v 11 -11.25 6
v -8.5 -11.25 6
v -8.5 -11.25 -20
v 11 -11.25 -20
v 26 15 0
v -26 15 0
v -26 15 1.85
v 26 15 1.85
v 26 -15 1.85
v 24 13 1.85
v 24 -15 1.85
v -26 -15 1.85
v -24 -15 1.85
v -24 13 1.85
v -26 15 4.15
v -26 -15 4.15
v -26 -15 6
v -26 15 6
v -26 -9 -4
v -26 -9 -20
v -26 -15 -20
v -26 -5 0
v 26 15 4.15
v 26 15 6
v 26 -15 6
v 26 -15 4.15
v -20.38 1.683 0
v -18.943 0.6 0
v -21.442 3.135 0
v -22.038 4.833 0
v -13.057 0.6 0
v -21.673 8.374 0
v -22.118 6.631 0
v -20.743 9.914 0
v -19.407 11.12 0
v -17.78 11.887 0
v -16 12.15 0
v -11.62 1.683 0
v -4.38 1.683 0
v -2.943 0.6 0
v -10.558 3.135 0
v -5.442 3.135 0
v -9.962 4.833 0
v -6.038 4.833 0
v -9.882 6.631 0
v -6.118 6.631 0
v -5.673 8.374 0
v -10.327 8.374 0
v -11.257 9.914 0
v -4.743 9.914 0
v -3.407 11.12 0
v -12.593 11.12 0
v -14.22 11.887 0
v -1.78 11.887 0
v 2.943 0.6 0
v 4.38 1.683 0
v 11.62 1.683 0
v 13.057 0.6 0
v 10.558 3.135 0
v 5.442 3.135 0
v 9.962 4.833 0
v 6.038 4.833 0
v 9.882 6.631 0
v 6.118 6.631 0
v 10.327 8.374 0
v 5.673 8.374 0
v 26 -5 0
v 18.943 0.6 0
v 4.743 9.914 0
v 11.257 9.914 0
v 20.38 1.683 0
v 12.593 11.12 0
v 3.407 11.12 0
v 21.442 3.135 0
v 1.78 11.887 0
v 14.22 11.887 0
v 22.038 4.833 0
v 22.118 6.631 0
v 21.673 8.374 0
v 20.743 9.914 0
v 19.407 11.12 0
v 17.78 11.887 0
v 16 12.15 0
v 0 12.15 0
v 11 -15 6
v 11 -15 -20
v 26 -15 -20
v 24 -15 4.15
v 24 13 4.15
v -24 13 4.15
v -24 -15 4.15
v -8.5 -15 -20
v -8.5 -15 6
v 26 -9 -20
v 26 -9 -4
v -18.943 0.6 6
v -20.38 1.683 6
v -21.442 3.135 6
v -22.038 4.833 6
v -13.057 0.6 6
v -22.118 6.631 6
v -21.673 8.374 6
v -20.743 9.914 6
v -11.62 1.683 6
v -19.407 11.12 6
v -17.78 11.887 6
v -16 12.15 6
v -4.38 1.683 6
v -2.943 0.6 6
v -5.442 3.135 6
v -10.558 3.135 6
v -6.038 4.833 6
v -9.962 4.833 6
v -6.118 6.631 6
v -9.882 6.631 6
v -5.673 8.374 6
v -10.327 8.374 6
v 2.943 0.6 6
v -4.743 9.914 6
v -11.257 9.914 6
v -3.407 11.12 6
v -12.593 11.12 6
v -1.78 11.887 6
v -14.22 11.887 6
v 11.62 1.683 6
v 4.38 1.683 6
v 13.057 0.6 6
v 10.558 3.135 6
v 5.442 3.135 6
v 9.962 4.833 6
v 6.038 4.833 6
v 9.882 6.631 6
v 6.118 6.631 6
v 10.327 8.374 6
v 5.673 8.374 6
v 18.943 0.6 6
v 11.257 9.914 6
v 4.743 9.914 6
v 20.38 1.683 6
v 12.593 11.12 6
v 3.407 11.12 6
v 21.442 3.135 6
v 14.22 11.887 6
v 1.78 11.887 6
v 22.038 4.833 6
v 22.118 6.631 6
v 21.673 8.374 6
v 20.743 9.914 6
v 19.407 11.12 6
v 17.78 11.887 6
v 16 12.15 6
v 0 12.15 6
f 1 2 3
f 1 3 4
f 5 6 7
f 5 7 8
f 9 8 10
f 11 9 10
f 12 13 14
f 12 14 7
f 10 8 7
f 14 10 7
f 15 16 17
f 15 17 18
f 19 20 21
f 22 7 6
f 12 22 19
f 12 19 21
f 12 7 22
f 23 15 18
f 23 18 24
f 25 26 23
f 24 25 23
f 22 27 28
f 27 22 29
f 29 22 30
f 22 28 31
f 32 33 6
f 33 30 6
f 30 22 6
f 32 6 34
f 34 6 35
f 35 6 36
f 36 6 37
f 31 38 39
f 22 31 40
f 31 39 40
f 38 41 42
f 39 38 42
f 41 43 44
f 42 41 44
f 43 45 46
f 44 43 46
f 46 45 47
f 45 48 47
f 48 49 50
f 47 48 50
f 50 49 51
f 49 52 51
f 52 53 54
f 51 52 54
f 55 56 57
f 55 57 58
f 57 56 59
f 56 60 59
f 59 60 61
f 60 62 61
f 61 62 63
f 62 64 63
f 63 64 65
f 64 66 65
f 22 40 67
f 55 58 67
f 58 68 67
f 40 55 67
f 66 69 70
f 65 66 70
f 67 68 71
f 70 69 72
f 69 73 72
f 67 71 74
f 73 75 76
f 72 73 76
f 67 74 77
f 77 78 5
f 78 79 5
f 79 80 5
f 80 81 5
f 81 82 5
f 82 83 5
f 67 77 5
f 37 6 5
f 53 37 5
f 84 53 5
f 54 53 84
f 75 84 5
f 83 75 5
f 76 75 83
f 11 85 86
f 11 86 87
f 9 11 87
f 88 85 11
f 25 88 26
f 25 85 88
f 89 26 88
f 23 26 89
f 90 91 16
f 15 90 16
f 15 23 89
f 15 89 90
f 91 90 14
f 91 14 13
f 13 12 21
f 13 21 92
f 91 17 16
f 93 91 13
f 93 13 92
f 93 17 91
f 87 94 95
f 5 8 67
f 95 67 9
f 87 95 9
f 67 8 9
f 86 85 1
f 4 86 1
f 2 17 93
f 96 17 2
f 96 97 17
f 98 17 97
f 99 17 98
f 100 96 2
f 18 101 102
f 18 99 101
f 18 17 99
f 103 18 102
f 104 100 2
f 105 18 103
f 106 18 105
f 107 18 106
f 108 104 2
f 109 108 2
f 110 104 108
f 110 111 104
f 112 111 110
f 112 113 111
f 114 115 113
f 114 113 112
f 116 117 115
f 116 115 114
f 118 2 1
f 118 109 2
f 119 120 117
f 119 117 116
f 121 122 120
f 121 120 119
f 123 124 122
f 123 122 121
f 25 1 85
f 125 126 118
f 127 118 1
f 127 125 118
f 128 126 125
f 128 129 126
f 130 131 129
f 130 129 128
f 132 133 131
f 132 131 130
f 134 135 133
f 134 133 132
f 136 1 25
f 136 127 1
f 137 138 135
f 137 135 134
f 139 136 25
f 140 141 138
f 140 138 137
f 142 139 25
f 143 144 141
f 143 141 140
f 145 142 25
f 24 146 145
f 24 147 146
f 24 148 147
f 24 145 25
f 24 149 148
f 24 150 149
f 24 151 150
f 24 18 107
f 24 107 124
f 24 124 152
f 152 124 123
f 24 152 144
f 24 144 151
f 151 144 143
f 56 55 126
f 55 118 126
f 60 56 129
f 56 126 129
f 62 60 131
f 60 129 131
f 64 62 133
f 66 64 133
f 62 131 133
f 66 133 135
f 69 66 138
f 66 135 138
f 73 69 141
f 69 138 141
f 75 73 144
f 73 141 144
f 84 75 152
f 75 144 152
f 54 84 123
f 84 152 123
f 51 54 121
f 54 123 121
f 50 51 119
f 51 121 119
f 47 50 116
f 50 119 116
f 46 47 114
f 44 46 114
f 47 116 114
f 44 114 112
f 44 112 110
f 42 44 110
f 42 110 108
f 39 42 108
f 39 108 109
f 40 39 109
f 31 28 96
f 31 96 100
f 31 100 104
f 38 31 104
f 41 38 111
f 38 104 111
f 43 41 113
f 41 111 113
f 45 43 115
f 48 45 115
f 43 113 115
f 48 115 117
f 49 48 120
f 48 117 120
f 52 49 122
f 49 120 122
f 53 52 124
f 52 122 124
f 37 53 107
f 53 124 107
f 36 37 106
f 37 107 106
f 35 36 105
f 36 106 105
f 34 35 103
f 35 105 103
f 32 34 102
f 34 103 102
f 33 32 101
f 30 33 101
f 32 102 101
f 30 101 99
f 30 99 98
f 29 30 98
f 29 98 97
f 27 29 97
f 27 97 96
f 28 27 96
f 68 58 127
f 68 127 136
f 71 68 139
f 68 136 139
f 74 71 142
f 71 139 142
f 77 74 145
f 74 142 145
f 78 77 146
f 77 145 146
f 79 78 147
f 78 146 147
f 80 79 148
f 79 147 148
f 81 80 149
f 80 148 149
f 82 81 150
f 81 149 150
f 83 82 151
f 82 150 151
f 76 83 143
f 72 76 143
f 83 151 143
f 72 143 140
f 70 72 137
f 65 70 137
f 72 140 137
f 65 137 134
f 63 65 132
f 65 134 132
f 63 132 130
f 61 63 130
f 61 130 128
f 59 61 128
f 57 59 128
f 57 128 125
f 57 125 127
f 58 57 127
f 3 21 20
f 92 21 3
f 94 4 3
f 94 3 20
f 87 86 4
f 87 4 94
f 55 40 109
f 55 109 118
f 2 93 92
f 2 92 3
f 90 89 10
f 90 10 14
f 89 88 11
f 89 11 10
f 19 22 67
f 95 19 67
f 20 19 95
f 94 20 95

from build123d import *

# Parameters (mm, degrees)
SKETCH_W        = 52
SKETCH_H        = 30
PAD_DEPTH       = 6
SKETCH001_R     = 6.15
POCKET_DEPTH    = 6
SKETCH002_W     = 30
SKETCH002_H     = 2.3
POCKET001_DEPTH = 2
SKETCH003_W     = 52
SKETCH003_H     = 2.3
POCKET002_DEPTH = 2
SKETCH004_W     = 30
SKETCH004_H     = 2.3
POCKET003_DEPTH = 2
SKETCH005_W     = 52
SKETCH005_H     = 6
PAD001_DEPTH    = 20
SKETCH006_W     = 19.5
SKETCH006_H     = 3.75
POCKET004_DEPTH = 26
CHAMFER_SIZE    = 4
SKETCH007_W     = 45
SKETCH007_H     = 2
PAD002_DEPTH    = 6


with BuildPart() as part:
    # Sketch → Pad (new body)
    with BuildSketch(Plane.XY):
        Rectangle(SKETCH_W, SKETCH_H)
    extrude(amount=PAD_DEPTH)

    # Sketch001 (on Face6 of Pad) → Pocket (cut)
    with BuildSketch(Plane.XY.offset(6)):
        with Locations((-16, 6)):
            Circle(SKETCH001_R)
        with Locations((0, 6)):
            Circle(SKETCH001_R)
        with Locations((16, 6)):
            Circle(SKETCH001_R)
    extrude(amount=-POCKET_DEPTH, mode=Mode.SUBTRACT)

    # Sketch002 (on Face3 of Pocket) → Pocket001 (cut)
    with BuildSketch(Plane.YZ.offset(26)):
        with Locations((0, 3)):
            Rectangle(SKETCH002_W, SKETCH002_H)
    extrude(amount=-POCKET001_DEPTH, mode=Mode.SUBTRACT)

    # Sketch003 (on Face1 of Pocket001) → Pocket002 (cut)
    with BuildSketch(Plane(origin=(0, 15, 0), x_dir=(-1, 0, 0), z_dir=(0, 1, 0))):
        with Locations((0, 3)):
            Rectangle(SKETCH003_W, SKETCH003_H)
    extrude(amount=-POCKET002_DEPTH, mode=Mode.SUBTRACT)

    # Sketch004 (on Face6 of Pocket002) → Pocket003 (cut)
    with BuildSketch(Plane(origin=(-26, 0, 0), x_dir=(0, -1, 0), z_dir=(-1, 0, 0))):
        with Locations((0, 3)):
            Rectangle(SKETCH004_W, SKETCH004_H)
    extrude(amount=-POCKET003_DEPTH, mode=Mode.SUBTRACT)

    # Sketch005 (on Face2 of Pocket003) → Pad001 (join)
    with BuildSketch(Plane(origin=(0, 0, 0), x_dir=(1, 0, 0), z_dir=(0, 0, -1))):
        with Locations((0, 12)):
            Rectangle(SKETCH005_W, SKETCH005_H)
    extrude(amount=PAD001_DEPTH)

    # Sketch006 (on Face19 of Pad001) → Pocket004 (cut)
    with BuildSketch(Plane.XY.offset(6)):
        with Locations((1.25, -13.125)):
            Rectangle(SKETCH006_W, SKETCH006_H)
    extrude(amount=-POCKET004_DEPTH, mode=Mode.SUBTRACT)

    # Chamfer
    chamfer_edges = [part.edges().sort_by_distance(p)[0] for p in [
        (0, -9, 0),
    ]]
    chamfer(chamfer_edges, length=CHAMFER_SIZE)

    # Sketch007 (on Face19 of Chamfer) → Pad002 (join)
    with BuildSketch(Plane.XY.offset(6)):
        with Locations((0, -0.4)):
            Rectangle(SKETCH007_W, SKETCH007_H)
    extrude(amount=-PAD002_DEPTH)


solid = part.part
